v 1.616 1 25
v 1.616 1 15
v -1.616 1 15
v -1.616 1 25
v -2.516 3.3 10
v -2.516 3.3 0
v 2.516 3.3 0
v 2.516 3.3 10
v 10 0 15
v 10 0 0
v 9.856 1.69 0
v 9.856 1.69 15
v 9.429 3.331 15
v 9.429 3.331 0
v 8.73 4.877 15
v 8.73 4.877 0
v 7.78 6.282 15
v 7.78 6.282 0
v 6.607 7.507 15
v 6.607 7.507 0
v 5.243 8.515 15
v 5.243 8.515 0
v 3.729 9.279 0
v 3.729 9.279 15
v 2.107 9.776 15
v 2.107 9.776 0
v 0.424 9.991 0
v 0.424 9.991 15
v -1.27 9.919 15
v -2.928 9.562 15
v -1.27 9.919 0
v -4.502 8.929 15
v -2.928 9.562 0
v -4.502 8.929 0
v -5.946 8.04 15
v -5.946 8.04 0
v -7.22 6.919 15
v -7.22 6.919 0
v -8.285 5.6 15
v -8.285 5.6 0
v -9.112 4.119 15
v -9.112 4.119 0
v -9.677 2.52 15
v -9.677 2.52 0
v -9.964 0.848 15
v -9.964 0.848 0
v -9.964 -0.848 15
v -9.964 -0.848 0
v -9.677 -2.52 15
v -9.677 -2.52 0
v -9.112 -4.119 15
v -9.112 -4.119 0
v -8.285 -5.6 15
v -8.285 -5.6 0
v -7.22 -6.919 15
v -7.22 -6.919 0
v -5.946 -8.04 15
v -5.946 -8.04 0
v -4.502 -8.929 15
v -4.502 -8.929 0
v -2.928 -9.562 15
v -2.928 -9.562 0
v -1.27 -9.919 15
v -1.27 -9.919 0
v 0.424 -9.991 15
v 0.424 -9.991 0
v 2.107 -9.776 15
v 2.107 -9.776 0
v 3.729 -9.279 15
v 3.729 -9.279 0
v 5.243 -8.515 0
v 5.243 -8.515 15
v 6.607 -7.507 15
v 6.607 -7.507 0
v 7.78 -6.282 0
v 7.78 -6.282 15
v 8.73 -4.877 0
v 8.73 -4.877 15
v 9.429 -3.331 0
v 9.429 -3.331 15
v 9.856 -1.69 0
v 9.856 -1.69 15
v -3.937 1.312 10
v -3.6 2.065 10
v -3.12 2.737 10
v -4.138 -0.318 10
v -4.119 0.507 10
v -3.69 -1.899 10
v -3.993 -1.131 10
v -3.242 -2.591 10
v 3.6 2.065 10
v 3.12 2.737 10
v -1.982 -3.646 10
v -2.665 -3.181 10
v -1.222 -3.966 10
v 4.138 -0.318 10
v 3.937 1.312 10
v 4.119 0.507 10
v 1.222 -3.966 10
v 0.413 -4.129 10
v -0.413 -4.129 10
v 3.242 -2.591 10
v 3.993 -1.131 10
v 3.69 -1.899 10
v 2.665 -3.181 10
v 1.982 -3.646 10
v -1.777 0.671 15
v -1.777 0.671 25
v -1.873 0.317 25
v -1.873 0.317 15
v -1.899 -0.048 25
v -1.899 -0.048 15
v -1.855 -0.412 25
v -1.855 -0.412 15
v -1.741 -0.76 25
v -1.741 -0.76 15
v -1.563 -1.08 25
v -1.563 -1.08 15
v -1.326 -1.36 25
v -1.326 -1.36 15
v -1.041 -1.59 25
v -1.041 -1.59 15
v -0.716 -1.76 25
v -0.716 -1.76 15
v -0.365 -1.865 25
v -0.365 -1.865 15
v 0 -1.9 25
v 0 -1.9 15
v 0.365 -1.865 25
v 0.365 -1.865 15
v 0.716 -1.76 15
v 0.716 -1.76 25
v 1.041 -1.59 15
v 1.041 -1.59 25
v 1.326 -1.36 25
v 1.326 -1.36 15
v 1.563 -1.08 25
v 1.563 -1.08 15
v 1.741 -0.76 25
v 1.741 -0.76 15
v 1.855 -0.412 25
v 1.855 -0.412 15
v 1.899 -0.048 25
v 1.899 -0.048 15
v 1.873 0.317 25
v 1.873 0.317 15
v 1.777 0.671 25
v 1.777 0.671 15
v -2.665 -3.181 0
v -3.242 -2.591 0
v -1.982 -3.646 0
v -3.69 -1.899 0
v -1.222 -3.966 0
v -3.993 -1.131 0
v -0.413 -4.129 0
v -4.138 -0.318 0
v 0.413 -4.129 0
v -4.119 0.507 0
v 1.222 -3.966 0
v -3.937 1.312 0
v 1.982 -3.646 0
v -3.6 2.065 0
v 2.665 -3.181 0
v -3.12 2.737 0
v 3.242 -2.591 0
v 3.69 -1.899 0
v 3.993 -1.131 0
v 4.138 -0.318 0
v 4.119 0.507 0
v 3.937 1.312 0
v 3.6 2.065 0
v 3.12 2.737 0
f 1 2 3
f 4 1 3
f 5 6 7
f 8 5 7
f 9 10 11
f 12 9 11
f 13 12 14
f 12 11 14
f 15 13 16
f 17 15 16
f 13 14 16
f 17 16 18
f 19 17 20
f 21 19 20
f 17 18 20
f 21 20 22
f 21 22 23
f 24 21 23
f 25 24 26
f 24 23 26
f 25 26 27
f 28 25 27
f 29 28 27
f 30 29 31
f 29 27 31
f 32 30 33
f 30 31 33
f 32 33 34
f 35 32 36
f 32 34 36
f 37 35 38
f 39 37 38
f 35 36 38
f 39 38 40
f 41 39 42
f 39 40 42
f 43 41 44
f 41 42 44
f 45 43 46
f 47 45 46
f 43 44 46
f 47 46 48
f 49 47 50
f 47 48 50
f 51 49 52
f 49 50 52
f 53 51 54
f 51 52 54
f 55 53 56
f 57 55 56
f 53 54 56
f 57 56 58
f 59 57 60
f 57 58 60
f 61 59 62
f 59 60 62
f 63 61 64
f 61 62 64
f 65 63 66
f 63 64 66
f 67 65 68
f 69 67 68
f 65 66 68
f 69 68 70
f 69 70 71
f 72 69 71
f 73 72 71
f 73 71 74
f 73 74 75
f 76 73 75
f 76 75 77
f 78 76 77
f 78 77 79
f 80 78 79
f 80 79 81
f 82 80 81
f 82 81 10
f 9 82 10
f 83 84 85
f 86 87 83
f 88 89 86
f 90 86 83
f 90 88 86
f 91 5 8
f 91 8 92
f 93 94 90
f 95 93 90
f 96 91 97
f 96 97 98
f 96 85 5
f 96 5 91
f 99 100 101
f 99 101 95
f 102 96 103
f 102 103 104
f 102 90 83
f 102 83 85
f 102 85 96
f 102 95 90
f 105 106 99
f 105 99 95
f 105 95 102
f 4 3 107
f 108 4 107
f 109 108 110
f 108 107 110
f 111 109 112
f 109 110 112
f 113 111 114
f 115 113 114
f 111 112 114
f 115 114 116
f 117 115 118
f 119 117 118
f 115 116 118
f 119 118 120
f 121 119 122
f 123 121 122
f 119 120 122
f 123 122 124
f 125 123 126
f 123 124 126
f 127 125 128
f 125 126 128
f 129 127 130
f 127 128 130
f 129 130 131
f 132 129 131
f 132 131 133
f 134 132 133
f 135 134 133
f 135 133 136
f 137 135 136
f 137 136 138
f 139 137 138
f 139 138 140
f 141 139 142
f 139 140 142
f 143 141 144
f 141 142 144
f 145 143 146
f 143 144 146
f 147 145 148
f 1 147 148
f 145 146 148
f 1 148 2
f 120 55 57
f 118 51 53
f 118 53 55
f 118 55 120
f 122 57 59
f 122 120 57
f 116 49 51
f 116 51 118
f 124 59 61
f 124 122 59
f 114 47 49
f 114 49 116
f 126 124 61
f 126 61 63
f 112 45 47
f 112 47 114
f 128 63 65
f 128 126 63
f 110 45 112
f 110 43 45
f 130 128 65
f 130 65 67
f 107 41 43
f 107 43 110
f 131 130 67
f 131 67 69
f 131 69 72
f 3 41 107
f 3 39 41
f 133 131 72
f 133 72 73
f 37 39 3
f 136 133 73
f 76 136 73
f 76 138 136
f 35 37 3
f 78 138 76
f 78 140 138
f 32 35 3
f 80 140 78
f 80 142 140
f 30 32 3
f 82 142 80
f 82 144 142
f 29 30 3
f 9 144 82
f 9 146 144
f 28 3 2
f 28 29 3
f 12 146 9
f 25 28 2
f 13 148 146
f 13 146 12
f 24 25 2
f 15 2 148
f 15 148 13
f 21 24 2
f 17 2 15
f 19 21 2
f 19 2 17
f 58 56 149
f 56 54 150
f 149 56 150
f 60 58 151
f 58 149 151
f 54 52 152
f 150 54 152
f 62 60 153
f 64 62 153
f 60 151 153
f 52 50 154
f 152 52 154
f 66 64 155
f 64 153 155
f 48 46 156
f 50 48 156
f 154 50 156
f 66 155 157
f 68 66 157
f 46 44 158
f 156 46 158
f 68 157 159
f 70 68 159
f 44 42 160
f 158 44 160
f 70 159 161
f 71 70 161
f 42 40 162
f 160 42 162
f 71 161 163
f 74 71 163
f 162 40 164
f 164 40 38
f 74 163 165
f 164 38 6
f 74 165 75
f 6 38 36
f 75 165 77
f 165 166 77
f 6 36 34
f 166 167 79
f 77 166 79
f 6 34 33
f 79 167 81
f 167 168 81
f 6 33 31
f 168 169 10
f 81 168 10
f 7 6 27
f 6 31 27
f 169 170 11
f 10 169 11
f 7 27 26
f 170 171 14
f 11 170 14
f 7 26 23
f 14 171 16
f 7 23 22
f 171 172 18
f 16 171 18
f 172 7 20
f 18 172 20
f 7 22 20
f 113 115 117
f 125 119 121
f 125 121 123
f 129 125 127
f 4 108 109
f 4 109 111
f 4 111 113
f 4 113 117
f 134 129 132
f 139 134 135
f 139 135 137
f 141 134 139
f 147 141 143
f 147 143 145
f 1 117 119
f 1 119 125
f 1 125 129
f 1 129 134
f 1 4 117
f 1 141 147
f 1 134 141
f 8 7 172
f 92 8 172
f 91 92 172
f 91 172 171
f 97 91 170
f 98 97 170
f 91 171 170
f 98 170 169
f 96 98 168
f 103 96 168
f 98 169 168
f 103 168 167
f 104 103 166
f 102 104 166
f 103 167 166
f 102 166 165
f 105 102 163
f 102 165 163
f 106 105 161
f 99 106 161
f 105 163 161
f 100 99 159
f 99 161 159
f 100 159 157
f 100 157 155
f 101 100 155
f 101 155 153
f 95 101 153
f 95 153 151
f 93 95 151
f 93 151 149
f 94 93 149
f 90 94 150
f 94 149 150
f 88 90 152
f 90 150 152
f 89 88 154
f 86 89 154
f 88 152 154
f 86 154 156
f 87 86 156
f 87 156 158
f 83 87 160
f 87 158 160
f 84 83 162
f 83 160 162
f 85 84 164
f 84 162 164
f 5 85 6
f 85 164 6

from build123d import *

# Parameters (mm, degrees)
F0_R     = 10
F1_DEPTH = 15
F3_DEPTH = 10
F5_DEPTH = 10


with BuildPart() as f1:
    # F0 (on Top) → F1 (new body)
    with BuildSketch(Plane.XY):
        Circle(F0_R)
    extrude(amount=F1_DEPTH)

    # F2 (on face) → F3 (cut)
    with BuildSketch(Plane(origin=(0, 0, 0), x_dir=(1, 0, 0), z_dir=(0, 0, -1))):
        with BuildLine():
            Line((-2.516446, -3.3), (2.516446, -3.3))
            ThreePointArc((2.516446, -3.3), (0, 4.15), (-2.516446, -3.3))
        make_face()
    extrude(amount=-F3_DEPTH, mode=Mode.SUBTRACT)

    # F4 (on face) → F5 (join)
    with BuildSketch(Plane.XY.offset(15)):
        with BuildLine():
            Line((1.615549, 1), (-1.615549, 1))
            ThreePointArc((-1.615549, 1), (0, -1.9), (1.615549, 1))
        make_face()
    extrude(amount=F5_DEPTH)


solid = f1.part
